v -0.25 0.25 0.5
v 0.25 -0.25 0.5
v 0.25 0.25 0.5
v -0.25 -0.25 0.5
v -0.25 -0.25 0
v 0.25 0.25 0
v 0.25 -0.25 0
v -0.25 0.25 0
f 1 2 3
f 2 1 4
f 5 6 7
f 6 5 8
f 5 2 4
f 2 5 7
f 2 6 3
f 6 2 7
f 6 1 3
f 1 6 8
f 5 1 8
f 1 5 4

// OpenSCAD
use <lib.scad>

hd = 36;
ld = 8;

module bodyHD($fn=hd) {
	translate([0,0,0.25]) rbox([0.5,0.5,0.5], 0.01, $fn=8);
}

module bodyLD($fn=ld) {
	translate([0,0,0.25]) box([0.5,0.5,0.5]);
}

bodyLD();
